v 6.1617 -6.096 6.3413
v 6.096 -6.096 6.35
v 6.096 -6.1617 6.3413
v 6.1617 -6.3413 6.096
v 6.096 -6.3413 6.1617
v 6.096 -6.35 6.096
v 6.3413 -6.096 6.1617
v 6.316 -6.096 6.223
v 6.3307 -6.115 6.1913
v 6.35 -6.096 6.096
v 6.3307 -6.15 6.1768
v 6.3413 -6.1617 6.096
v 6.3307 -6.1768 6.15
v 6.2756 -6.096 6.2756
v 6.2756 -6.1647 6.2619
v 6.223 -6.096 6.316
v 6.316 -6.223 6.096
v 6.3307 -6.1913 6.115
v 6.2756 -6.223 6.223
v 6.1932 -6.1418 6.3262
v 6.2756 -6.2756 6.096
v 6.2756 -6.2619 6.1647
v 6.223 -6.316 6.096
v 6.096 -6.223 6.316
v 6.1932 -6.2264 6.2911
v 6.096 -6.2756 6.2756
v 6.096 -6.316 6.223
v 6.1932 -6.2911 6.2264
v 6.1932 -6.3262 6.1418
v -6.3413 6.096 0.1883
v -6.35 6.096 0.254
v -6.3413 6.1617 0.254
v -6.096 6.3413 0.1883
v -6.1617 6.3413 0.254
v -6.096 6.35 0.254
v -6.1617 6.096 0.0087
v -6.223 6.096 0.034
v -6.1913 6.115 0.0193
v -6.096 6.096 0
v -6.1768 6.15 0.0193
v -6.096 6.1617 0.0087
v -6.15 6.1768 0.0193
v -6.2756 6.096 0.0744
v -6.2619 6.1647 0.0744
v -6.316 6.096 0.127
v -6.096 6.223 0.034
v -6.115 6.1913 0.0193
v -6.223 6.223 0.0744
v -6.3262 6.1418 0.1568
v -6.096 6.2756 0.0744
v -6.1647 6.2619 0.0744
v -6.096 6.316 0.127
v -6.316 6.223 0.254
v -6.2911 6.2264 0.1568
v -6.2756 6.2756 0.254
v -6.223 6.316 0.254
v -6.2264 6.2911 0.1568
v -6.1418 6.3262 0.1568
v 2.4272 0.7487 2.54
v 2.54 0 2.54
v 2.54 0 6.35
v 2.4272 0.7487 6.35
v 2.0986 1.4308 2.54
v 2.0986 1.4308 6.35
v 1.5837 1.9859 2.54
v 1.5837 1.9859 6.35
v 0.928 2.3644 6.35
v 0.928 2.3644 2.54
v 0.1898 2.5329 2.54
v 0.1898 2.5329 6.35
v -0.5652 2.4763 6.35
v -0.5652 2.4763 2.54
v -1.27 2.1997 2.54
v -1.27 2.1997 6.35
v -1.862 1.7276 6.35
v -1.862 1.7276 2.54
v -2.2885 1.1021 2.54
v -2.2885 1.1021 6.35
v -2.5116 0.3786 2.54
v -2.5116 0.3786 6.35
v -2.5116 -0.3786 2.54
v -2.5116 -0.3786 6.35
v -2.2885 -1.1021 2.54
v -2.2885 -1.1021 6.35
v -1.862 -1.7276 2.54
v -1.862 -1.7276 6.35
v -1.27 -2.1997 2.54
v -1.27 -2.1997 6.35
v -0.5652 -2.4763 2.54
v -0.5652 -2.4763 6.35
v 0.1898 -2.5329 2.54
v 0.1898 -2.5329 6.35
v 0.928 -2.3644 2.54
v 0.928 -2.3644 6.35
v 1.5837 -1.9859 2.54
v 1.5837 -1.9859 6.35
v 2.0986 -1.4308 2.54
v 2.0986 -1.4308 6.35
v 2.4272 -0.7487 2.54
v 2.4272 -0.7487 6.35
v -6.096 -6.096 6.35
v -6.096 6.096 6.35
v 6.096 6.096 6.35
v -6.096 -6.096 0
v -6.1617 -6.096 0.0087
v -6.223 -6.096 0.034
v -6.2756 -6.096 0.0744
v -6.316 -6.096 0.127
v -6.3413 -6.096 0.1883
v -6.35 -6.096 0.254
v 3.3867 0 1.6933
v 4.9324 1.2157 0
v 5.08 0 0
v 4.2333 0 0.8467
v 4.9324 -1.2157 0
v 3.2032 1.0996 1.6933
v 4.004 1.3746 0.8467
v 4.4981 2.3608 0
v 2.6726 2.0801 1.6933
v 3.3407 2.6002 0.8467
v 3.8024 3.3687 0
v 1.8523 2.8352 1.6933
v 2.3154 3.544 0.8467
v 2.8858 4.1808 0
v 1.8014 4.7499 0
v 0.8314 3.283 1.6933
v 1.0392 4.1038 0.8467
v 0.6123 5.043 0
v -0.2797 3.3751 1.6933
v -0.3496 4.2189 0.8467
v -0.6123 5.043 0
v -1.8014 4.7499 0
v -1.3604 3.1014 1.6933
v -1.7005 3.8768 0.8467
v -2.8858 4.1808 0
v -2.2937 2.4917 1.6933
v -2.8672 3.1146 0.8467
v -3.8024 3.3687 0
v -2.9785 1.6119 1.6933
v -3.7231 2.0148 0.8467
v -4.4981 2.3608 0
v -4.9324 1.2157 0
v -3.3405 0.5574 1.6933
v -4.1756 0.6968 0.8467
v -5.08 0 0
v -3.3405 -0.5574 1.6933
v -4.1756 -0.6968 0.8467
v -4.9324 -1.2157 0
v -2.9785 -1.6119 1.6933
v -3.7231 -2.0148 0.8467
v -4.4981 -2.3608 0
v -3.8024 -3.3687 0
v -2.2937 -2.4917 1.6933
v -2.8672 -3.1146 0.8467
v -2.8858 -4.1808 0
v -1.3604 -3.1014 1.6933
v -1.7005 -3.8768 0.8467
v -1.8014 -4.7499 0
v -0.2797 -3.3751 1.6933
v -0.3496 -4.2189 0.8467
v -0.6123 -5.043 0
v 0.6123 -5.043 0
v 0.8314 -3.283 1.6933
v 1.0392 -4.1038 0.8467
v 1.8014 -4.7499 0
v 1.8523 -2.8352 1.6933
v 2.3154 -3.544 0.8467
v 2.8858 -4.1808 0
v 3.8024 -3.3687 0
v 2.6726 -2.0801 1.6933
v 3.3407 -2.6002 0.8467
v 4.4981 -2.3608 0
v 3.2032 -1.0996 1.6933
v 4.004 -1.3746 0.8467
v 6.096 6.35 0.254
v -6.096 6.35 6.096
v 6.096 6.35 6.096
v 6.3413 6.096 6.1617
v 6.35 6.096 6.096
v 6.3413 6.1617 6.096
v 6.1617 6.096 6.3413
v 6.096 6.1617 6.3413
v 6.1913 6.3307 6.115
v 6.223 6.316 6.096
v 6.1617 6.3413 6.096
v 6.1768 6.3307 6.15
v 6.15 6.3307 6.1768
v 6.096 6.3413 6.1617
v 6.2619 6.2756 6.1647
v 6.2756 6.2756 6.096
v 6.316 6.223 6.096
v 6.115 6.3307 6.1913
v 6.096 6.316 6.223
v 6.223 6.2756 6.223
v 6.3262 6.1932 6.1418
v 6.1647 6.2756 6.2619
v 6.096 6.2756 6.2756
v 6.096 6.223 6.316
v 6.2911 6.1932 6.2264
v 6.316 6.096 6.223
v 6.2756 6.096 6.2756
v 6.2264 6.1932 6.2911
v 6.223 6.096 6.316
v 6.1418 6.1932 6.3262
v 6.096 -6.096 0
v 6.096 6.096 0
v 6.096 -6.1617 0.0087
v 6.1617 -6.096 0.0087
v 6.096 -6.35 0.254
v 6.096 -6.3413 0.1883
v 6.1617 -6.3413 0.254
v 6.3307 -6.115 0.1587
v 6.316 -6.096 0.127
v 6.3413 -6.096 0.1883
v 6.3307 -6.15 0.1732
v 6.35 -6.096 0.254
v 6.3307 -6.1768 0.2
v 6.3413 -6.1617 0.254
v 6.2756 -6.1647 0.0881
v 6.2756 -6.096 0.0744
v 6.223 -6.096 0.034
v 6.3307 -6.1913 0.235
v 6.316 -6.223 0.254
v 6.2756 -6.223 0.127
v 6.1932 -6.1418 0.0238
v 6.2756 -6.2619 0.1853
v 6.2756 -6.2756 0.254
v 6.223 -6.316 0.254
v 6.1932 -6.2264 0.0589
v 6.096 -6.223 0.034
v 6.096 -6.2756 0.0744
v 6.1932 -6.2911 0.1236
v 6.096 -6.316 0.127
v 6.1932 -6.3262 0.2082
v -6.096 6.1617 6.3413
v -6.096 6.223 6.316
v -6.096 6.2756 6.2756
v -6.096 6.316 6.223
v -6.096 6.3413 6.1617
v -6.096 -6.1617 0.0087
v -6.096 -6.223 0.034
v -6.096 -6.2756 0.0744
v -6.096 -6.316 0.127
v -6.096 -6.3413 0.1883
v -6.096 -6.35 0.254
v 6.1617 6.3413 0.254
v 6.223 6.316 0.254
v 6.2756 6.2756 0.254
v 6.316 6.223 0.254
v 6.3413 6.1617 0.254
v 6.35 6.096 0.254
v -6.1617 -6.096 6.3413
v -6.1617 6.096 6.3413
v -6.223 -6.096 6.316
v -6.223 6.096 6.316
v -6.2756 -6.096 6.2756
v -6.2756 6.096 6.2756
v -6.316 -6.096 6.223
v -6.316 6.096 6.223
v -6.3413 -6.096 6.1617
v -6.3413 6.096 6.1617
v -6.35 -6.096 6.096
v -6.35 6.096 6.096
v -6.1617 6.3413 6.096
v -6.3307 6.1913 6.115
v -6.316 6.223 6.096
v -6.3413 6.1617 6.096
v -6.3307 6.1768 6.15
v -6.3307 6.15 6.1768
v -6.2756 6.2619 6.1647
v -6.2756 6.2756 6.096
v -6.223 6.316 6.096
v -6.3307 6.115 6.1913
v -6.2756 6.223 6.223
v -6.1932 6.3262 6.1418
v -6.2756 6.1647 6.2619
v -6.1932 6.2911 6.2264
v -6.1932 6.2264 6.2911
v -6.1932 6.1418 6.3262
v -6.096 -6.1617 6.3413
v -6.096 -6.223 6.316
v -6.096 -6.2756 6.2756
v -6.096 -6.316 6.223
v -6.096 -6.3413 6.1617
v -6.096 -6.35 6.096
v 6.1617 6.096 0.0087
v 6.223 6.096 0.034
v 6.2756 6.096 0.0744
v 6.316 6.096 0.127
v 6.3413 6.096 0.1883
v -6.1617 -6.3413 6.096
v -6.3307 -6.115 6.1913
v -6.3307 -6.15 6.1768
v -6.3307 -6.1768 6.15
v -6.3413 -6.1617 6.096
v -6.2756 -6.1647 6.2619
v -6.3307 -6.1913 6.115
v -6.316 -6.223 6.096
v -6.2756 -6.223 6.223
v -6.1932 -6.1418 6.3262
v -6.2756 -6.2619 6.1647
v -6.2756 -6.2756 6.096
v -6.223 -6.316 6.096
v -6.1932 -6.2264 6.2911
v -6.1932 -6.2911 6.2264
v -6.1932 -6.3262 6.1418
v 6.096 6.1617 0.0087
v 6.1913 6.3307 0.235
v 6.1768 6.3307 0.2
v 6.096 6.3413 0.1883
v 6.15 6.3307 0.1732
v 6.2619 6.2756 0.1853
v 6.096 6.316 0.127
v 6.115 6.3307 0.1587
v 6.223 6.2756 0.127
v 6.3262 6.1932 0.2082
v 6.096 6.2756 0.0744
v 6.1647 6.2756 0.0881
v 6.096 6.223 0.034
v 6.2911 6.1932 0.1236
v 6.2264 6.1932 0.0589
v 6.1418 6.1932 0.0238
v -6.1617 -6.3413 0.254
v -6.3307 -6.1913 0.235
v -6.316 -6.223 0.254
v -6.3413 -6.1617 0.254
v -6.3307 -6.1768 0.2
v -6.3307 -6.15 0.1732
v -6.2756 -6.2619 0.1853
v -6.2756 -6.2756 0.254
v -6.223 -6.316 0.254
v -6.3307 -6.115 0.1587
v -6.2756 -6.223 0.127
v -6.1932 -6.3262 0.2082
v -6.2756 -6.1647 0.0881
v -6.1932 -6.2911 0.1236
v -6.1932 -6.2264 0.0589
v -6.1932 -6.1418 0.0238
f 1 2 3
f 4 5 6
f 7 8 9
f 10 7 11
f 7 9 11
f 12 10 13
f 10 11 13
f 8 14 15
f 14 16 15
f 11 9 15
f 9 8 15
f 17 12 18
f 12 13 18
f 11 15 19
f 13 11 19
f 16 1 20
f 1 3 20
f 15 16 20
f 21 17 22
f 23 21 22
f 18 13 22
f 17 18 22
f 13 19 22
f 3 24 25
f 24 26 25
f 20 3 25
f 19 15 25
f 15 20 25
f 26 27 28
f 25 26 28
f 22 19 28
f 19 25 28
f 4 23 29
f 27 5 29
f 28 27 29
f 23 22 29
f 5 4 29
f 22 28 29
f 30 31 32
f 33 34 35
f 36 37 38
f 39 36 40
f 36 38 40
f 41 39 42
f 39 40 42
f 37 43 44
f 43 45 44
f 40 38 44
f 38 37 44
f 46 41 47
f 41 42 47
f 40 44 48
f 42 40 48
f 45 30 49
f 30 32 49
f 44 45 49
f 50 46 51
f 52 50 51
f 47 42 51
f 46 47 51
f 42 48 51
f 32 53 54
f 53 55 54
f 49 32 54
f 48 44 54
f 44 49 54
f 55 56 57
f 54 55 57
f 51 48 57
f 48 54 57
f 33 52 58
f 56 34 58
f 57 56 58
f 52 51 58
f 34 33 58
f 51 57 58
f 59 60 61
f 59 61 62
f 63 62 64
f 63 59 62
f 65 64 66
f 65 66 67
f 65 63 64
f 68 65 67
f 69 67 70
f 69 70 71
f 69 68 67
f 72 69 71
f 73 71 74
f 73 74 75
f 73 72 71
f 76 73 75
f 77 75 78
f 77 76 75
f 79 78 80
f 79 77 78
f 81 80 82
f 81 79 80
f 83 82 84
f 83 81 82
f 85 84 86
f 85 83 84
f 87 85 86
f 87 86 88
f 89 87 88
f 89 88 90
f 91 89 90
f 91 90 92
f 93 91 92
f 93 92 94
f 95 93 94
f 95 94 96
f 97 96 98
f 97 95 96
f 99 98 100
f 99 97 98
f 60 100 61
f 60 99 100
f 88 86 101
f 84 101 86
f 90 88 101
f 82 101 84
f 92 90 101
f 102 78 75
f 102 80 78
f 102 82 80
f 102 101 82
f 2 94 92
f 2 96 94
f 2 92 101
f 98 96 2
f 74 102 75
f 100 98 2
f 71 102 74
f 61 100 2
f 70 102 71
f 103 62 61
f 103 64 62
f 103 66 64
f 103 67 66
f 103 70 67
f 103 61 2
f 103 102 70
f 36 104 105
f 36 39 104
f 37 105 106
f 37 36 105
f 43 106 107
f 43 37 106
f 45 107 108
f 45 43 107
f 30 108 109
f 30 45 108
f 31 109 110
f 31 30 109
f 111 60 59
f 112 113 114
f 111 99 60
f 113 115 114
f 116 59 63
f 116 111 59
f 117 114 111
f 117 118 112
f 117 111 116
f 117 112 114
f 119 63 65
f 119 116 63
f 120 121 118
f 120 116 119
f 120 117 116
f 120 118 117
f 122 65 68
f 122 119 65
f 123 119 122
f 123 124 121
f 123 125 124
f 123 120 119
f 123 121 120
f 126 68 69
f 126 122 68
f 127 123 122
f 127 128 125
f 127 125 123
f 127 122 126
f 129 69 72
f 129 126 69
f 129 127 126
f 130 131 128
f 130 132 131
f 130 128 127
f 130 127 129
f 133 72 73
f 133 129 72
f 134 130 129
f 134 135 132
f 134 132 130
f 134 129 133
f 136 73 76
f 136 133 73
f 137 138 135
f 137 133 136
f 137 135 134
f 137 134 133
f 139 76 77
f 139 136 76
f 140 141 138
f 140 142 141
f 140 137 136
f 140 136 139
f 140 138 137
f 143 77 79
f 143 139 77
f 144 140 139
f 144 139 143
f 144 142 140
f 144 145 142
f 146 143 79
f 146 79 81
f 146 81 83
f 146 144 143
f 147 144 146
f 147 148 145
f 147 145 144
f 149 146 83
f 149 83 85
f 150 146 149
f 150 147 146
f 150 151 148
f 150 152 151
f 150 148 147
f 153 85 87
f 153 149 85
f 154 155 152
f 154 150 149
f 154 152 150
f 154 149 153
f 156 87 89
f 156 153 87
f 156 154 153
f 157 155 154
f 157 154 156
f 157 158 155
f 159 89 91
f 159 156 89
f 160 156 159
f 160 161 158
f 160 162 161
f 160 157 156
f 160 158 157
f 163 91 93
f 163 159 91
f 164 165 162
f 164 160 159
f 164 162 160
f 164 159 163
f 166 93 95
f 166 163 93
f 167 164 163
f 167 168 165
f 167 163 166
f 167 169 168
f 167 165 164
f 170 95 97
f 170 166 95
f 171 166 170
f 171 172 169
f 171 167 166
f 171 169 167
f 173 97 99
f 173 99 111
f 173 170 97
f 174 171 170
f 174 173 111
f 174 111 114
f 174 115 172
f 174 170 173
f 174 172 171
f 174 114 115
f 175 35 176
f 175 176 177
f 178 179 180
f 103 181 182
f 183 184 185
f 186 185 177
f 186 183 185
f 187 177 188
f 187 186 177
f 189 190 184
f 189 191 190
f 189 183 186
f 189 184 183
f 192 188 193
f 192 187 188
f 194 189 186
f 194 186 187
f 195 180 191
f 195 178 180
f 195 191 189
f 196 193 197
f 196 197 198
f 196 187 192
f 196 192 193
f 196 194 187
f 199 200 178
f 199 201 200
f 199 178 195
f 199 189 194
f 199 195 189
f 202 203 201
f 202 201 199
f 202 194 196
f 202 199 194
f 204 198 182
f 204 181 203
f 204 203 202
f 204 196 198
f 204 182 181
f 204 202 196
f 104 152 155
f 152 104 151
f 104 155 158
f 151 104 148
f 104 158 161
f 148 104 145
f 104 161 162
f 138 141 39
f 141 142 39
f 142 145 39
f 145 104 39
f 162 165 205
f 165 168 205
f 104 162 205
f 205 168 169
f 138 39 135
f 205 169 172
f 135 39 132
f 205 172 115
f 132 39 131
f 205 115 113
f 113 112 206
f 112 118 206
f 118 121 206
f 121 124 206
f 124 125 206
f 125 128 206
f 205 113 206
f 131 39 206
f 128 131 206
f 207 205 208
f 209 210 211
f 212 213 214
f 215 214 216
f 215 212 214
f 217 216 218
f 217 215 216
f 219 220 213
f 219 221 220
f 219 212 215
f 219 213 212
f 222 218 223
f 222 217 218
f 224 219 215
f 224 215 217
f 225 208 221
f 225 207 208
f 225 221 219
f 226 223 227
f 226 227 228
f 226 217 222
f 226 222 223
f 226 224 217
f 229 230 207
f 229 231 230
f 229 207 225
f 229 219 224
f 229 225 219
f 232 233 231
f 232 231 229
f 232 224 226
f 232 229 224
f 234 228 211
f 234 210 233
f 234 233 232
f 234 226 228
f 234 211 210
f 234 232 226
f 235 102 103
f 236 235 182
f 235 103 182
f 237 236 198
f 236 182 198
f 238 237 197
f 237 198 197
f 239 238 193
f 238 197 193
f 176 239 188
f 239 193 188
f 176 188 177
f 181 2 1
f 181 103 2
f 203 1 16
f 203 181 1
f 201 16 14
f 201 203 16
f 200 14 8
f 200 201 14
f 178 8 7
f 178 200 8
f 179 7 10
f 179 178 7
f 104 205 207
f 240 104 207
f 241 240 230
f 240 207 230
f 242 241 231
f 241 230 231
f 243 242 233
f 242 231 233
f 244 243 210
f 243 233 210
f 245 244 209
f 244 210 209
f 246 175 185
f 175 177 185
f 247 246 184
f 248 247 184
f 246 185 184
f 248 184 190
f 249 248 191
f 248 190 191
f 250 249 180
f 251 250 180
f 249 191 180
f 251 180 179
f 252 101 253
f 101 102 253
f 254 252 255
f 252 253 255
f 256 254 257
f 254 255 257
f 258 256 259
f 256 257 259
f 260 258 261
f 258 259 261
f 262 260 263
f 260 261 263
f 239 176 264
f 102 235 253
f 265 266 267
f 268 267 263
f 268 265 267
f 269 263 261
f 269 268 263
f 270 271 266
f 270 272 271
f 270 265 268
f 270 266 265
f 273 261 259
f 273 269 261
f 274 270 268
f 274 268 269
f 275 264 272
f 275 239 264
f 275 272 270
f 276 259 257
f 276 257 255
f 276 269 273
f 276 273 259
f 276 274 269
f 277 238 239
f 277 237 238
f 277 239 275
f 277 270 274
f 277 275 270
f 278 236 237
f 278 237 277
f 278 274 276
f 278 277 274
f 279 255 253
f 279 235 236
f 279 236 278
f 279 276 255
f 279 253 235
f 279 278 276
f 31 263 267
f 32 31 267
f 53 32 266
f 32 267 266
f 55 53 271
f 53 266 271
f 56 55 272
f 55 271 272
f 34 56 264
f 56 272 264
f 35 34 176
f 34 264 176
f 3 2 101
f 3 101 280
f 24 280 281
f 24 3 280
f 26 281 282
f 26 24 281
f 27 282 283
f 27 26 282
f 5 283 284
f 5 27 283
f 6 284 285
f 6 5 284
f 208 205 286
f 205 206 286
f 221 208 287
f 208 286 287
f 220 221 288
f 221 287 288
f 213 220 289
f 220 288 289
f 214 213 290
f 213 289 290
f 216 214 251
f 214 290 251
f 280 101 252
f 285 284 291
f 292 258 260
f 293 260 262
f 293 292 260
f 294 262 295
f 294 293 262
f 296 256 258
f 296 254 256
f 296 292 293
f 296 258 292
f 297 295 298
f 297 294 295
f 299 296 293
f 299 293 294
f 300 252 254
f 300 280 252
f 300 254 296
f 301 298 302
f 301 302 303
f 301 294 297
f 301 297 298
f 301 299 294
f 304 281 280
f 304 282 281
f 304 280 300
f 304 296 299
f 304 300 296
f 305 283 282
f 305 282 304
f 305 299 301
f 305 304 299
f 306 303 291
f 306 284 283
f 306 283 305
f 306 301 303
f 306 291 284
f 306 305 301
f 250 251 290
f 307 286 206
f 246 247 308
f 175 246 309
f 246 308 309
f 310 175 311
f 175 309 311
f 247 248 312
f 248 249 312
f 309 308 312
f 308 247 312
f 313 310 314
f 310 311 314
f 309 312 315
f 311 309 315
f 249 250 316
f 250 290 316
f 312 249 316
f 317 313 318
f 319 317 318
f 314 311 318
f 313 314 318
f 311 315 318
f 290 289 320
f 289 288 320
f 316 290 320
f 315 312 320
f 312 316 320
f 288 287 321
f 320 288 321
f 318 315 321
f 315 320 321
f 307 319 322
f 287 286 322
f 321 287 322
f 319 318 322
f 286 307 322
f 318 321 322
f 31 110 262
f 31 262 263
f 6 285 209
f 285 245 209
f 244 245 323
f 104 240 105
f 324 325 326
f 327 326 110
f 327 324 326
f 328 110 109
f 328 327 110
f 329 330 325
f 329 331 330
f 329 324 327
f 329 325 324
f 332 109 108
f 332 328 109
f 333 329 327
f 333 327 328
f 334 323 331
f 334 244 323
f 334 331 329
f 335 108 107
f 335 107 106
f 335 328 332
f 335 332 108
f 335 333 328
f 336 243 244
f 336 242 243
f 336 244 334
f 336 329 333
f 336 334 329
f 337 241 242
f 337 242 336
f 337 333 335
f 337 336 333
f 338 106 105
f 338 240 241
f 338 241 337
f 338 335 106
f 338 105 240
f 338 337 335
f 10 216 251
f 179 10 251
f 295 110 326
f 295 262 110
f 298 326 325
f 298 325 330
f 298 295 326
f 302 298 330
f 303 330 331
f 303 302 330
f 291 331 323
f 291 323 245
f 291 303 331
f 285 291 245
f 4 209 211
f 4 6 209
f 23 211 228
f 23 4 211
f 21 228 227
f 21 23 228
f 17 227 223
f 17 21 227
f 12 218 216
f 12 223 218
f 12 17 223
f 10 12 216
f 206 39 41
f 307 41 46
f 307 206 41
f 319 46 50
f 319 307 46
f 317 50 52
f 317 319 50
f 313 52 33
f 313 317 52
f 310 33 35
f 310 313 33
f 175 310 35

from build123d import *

# Parameters (mm, degrees)
F0_W     = 12.7
F0_H     = 12.7
F0_R     = 2.54
F1_DEPTH = 6.35
F2_SIZE  = 2.54
F3_R     = 0.254


with BuildPart() as f1:
    # F0 (on Top) → F1 (new body)
    with BuildSketch(Plane.XY):
        Rectangle(F0_W, F0_H)
        Circle(F0_R, mode=Mode.SUBTRACT)
    extrude(amount=F1_DEPTH)

    # F2
    f2_edges = [f1.edges().sort_by_distance(p)[0] for p in [
        (-2.54, 0, 0),
    ]]
    chamfer(f2_edges, length=F2_SIZE)

    # F3
    f3_edges = [f1.edges().sort_by_distance(p)[0] for p in [
        (0, -6.35, 6.35),
        (0, -6.35, 0),
        (6.35, 0, 0),
        (6.35, 0, 6.35),
        (6.35, -6.35, 3.175),
        (6.35, 6.35, 3.175),
        (0, 6.35, 6.35),
        (-6.35, 6.35, 3.175),
        (-6.35, 0, 6.35),
        (-6.35, -6.35, 3.175),
        (-6.35, 0, 0),
        (0, 6.35, 0),
    ]]
    fillet(f3_edges, radius=F3_R)


solid = f1.part
